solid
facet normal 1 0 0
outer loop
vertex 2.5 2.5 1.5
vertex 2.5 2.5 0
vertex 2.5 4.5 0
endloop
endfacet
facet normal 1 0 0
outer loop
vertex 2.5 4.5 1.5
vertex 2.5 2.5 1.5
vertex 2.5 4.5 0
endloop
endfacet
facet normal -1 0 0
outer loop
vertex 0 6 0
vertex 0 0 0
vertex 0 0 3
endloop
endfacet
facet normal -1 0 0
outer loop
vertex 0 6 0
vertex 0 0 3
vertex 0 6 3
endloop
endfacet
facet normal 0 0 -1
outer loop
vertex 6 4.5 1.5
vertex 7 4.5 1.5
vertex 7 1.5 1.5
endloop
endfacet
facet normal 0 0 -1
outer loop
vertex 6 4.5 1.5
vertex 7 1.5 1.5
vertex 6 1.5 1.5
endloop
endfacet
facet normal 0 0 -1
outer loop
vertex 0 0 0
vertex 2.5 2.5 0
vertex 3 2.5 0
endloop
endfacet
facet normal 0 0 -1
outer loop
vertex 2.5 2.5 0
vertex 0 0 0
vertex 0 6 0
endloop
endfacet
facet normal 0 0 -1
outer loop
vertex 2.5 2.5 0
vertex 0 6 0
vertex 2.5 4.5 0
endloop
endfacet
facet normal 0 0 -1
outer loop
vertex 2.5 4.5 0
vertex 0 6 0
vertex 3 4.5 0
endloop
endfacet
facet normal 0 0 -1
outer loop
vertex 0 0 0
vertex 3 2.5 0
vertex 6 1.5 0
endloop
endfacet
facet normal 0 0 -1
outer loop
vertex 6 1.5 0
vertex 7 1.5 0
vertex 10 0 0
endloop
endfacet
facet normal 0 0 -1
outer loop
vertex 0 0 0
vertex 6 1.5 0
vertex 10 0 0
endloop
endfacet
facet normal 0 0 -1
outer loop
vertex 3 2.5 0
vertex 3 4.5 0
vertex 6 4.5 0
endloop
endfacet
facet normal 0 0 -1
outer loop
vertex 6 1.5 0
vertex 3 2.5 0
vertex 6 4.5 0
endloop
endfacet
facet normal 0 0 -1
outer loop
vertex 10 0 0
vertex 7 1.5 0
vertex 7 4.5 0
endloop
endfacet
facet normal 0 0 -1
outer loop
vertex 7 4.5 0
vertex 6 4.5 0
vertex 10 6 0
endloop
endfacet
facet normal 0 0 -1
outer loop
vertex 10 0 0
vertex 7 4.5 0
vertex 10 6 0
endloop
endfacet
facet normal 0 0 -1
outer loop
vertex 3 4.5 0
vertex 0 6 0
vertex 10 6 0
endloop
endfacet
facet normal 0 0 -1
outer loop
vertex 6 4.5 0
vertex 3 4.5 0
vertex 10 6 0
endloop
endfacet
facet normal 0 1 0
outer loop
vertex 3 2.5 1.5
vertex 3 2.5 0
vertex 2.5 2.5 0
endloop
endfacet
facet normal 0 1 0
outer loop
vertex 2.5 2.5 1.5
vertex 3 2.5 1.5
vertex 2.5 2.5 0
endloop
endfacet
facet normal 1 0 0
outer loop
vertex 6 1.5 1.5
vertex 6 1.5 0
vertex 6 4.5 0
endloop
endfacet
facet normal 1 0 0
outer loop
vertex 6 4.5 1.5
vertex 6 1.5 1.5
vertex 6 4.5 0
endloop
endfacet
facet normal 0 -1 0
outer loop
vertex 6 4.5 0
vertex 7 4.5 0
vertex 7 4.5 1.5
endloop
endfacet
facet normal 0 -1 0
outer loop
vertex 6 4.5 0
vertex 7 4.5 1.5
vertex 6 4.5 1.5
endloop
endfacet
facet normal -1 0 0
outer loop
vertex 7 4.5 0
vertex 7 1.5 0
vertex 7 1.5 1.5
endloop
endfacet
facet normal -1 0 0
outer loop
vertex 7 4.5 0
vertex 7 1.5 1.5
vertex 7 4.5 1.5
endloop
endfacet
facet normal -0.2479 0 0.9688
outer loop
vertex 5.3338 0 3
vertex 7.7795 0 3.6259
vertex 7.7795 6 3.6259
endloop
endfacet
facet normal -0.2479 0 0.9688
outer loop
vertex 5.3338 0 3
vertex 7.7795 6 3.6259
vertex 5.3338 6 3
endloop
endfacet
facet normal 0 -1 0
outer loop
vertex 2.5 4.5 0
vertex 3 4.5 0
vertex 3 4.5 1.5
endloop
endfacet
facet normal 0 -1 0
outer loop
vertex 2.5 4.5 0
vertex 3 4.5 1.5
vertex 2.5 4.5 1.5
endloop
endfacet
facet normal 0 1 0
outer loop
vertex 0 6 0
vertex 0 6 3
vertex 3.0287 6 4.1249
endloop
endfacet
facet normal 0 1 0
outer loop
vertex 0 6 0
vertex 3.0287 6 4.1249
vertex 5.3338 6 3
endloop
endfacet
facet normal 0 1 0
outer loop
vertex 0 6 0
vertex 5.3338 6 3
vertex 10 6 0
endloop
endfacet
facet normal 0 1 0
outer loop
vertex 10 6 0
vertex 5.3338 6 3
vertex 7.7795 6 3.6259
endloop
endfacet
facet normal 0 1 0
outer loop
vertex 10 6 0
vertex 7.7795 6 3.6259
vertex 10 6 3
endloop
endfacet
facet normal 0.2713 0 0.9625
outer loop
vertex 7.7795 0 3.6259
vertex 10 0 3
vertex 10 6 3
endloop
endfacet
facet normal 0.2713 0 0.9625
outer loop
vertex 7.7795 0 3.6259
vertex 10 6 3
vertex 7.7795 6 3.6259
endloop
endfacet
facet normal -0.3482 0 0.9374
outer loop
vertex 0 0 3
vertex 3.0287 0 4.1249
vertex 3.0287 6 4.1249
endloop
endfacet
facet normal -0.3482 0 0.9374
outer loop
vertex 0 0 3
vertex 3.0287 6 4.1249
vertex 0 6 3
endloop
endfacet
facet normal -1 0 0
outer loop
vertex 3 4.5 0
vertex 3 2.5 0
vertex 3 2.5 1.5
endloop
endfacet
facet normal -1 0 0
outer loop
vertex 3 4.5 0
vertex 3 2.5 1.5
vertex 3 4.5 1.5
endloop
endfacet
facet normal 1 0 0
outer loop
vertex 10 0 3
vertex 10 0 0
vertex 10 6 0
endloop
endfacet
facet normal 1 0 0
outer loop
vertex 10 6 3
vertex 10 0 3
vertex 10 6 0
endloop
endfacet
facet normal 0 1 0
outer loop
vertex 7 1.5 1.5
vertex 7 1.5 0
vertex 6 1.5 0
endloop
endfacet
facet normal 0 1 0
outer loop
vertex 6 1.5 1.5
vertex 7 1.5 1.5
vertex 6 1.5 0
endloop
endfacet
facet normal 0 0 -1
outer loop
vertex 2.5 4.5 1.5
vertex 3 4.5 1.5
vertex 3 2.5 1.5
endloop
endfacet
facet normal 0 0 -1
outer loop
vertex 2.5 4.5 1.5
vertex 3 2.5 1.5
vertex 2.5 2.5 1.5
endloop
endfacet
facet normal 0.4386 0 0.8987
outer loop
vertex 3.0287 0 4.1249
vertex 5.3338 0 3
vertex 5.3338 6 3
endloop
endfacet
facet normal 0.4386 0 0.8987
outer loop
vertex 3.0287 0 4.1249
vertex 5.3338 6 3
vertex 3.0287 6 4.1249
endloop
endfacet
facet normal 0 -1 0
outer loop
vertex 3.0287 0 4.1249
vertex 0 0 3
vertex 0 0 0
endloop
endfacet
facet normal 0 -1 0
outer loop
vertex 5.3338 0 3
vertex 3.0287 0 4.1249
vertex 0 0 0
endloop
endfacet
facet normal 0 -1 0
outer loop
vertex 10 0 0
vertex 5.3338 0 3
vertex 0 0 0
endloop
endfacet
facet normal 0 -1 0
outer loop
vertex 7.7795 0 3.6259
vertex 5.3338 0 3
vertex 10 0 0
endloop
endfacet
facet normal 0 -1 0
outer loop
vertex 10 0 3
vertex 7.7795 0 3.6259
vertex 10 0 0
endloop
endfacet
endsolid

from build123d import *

# Parameters (mm, degrees)
SKETCH1_W           = 10
SKETCH1_H           = 6
BOSS_EXTRUDE1_DEPTH = 3
BOSS_EXTRUDE2_DEPTH = 6
SKETCH3_W           = 0.5
SKETCH3_H           = 2
SKETCH3_W_2         = 1
SKETCH3_H_2         = 3
CUT_EXTRUDE1_DEPTH  = 1.5


with BuildPart() as part:
    # Sketch1 → Boss-Extrude1 (new body)
    with BuildSketch(Plane.XY):
        with Locations((5, 3)):
            Rectangle(SKETCH1_W, SKETCH1_H)
    extrude(amount=BOSS_EXTRUDE1_DEPTH)

    # Sketch2 → Boss-Extrude2 (add)
    with BuildSketch(Plane.XZ):
        Polygon((3.028685262, 4.124905721), (0, 3), (5.333823351, 3), align=None)
        Polygon((7.779518642, 3.625927659), (5.333823351, 3), (10, 3), align=None)
    extrude(amount=-BOSS_EXTRUDE2_DEPTH)

    # Sketch3 → Cut-Extrude1 (cut)
    with BuildSketch(Plane(origin=(0, 0, 0), x_dir=(-1, 0, 0), z_dir=(0, 0, -1))):
        with Locations((-2.75, 3.5)):
            Rectangle(SKETCH3_W, SKETCH3_H)
        with Locations((-6.5, 3)):
            Rectangle(SKETCH3_W_2, SKETCH3_H_2)
    extrude(amount=-CUT_EXTRUDE1_DEPTH, mode=Mode.SUBTRACT)


solid = part.part
